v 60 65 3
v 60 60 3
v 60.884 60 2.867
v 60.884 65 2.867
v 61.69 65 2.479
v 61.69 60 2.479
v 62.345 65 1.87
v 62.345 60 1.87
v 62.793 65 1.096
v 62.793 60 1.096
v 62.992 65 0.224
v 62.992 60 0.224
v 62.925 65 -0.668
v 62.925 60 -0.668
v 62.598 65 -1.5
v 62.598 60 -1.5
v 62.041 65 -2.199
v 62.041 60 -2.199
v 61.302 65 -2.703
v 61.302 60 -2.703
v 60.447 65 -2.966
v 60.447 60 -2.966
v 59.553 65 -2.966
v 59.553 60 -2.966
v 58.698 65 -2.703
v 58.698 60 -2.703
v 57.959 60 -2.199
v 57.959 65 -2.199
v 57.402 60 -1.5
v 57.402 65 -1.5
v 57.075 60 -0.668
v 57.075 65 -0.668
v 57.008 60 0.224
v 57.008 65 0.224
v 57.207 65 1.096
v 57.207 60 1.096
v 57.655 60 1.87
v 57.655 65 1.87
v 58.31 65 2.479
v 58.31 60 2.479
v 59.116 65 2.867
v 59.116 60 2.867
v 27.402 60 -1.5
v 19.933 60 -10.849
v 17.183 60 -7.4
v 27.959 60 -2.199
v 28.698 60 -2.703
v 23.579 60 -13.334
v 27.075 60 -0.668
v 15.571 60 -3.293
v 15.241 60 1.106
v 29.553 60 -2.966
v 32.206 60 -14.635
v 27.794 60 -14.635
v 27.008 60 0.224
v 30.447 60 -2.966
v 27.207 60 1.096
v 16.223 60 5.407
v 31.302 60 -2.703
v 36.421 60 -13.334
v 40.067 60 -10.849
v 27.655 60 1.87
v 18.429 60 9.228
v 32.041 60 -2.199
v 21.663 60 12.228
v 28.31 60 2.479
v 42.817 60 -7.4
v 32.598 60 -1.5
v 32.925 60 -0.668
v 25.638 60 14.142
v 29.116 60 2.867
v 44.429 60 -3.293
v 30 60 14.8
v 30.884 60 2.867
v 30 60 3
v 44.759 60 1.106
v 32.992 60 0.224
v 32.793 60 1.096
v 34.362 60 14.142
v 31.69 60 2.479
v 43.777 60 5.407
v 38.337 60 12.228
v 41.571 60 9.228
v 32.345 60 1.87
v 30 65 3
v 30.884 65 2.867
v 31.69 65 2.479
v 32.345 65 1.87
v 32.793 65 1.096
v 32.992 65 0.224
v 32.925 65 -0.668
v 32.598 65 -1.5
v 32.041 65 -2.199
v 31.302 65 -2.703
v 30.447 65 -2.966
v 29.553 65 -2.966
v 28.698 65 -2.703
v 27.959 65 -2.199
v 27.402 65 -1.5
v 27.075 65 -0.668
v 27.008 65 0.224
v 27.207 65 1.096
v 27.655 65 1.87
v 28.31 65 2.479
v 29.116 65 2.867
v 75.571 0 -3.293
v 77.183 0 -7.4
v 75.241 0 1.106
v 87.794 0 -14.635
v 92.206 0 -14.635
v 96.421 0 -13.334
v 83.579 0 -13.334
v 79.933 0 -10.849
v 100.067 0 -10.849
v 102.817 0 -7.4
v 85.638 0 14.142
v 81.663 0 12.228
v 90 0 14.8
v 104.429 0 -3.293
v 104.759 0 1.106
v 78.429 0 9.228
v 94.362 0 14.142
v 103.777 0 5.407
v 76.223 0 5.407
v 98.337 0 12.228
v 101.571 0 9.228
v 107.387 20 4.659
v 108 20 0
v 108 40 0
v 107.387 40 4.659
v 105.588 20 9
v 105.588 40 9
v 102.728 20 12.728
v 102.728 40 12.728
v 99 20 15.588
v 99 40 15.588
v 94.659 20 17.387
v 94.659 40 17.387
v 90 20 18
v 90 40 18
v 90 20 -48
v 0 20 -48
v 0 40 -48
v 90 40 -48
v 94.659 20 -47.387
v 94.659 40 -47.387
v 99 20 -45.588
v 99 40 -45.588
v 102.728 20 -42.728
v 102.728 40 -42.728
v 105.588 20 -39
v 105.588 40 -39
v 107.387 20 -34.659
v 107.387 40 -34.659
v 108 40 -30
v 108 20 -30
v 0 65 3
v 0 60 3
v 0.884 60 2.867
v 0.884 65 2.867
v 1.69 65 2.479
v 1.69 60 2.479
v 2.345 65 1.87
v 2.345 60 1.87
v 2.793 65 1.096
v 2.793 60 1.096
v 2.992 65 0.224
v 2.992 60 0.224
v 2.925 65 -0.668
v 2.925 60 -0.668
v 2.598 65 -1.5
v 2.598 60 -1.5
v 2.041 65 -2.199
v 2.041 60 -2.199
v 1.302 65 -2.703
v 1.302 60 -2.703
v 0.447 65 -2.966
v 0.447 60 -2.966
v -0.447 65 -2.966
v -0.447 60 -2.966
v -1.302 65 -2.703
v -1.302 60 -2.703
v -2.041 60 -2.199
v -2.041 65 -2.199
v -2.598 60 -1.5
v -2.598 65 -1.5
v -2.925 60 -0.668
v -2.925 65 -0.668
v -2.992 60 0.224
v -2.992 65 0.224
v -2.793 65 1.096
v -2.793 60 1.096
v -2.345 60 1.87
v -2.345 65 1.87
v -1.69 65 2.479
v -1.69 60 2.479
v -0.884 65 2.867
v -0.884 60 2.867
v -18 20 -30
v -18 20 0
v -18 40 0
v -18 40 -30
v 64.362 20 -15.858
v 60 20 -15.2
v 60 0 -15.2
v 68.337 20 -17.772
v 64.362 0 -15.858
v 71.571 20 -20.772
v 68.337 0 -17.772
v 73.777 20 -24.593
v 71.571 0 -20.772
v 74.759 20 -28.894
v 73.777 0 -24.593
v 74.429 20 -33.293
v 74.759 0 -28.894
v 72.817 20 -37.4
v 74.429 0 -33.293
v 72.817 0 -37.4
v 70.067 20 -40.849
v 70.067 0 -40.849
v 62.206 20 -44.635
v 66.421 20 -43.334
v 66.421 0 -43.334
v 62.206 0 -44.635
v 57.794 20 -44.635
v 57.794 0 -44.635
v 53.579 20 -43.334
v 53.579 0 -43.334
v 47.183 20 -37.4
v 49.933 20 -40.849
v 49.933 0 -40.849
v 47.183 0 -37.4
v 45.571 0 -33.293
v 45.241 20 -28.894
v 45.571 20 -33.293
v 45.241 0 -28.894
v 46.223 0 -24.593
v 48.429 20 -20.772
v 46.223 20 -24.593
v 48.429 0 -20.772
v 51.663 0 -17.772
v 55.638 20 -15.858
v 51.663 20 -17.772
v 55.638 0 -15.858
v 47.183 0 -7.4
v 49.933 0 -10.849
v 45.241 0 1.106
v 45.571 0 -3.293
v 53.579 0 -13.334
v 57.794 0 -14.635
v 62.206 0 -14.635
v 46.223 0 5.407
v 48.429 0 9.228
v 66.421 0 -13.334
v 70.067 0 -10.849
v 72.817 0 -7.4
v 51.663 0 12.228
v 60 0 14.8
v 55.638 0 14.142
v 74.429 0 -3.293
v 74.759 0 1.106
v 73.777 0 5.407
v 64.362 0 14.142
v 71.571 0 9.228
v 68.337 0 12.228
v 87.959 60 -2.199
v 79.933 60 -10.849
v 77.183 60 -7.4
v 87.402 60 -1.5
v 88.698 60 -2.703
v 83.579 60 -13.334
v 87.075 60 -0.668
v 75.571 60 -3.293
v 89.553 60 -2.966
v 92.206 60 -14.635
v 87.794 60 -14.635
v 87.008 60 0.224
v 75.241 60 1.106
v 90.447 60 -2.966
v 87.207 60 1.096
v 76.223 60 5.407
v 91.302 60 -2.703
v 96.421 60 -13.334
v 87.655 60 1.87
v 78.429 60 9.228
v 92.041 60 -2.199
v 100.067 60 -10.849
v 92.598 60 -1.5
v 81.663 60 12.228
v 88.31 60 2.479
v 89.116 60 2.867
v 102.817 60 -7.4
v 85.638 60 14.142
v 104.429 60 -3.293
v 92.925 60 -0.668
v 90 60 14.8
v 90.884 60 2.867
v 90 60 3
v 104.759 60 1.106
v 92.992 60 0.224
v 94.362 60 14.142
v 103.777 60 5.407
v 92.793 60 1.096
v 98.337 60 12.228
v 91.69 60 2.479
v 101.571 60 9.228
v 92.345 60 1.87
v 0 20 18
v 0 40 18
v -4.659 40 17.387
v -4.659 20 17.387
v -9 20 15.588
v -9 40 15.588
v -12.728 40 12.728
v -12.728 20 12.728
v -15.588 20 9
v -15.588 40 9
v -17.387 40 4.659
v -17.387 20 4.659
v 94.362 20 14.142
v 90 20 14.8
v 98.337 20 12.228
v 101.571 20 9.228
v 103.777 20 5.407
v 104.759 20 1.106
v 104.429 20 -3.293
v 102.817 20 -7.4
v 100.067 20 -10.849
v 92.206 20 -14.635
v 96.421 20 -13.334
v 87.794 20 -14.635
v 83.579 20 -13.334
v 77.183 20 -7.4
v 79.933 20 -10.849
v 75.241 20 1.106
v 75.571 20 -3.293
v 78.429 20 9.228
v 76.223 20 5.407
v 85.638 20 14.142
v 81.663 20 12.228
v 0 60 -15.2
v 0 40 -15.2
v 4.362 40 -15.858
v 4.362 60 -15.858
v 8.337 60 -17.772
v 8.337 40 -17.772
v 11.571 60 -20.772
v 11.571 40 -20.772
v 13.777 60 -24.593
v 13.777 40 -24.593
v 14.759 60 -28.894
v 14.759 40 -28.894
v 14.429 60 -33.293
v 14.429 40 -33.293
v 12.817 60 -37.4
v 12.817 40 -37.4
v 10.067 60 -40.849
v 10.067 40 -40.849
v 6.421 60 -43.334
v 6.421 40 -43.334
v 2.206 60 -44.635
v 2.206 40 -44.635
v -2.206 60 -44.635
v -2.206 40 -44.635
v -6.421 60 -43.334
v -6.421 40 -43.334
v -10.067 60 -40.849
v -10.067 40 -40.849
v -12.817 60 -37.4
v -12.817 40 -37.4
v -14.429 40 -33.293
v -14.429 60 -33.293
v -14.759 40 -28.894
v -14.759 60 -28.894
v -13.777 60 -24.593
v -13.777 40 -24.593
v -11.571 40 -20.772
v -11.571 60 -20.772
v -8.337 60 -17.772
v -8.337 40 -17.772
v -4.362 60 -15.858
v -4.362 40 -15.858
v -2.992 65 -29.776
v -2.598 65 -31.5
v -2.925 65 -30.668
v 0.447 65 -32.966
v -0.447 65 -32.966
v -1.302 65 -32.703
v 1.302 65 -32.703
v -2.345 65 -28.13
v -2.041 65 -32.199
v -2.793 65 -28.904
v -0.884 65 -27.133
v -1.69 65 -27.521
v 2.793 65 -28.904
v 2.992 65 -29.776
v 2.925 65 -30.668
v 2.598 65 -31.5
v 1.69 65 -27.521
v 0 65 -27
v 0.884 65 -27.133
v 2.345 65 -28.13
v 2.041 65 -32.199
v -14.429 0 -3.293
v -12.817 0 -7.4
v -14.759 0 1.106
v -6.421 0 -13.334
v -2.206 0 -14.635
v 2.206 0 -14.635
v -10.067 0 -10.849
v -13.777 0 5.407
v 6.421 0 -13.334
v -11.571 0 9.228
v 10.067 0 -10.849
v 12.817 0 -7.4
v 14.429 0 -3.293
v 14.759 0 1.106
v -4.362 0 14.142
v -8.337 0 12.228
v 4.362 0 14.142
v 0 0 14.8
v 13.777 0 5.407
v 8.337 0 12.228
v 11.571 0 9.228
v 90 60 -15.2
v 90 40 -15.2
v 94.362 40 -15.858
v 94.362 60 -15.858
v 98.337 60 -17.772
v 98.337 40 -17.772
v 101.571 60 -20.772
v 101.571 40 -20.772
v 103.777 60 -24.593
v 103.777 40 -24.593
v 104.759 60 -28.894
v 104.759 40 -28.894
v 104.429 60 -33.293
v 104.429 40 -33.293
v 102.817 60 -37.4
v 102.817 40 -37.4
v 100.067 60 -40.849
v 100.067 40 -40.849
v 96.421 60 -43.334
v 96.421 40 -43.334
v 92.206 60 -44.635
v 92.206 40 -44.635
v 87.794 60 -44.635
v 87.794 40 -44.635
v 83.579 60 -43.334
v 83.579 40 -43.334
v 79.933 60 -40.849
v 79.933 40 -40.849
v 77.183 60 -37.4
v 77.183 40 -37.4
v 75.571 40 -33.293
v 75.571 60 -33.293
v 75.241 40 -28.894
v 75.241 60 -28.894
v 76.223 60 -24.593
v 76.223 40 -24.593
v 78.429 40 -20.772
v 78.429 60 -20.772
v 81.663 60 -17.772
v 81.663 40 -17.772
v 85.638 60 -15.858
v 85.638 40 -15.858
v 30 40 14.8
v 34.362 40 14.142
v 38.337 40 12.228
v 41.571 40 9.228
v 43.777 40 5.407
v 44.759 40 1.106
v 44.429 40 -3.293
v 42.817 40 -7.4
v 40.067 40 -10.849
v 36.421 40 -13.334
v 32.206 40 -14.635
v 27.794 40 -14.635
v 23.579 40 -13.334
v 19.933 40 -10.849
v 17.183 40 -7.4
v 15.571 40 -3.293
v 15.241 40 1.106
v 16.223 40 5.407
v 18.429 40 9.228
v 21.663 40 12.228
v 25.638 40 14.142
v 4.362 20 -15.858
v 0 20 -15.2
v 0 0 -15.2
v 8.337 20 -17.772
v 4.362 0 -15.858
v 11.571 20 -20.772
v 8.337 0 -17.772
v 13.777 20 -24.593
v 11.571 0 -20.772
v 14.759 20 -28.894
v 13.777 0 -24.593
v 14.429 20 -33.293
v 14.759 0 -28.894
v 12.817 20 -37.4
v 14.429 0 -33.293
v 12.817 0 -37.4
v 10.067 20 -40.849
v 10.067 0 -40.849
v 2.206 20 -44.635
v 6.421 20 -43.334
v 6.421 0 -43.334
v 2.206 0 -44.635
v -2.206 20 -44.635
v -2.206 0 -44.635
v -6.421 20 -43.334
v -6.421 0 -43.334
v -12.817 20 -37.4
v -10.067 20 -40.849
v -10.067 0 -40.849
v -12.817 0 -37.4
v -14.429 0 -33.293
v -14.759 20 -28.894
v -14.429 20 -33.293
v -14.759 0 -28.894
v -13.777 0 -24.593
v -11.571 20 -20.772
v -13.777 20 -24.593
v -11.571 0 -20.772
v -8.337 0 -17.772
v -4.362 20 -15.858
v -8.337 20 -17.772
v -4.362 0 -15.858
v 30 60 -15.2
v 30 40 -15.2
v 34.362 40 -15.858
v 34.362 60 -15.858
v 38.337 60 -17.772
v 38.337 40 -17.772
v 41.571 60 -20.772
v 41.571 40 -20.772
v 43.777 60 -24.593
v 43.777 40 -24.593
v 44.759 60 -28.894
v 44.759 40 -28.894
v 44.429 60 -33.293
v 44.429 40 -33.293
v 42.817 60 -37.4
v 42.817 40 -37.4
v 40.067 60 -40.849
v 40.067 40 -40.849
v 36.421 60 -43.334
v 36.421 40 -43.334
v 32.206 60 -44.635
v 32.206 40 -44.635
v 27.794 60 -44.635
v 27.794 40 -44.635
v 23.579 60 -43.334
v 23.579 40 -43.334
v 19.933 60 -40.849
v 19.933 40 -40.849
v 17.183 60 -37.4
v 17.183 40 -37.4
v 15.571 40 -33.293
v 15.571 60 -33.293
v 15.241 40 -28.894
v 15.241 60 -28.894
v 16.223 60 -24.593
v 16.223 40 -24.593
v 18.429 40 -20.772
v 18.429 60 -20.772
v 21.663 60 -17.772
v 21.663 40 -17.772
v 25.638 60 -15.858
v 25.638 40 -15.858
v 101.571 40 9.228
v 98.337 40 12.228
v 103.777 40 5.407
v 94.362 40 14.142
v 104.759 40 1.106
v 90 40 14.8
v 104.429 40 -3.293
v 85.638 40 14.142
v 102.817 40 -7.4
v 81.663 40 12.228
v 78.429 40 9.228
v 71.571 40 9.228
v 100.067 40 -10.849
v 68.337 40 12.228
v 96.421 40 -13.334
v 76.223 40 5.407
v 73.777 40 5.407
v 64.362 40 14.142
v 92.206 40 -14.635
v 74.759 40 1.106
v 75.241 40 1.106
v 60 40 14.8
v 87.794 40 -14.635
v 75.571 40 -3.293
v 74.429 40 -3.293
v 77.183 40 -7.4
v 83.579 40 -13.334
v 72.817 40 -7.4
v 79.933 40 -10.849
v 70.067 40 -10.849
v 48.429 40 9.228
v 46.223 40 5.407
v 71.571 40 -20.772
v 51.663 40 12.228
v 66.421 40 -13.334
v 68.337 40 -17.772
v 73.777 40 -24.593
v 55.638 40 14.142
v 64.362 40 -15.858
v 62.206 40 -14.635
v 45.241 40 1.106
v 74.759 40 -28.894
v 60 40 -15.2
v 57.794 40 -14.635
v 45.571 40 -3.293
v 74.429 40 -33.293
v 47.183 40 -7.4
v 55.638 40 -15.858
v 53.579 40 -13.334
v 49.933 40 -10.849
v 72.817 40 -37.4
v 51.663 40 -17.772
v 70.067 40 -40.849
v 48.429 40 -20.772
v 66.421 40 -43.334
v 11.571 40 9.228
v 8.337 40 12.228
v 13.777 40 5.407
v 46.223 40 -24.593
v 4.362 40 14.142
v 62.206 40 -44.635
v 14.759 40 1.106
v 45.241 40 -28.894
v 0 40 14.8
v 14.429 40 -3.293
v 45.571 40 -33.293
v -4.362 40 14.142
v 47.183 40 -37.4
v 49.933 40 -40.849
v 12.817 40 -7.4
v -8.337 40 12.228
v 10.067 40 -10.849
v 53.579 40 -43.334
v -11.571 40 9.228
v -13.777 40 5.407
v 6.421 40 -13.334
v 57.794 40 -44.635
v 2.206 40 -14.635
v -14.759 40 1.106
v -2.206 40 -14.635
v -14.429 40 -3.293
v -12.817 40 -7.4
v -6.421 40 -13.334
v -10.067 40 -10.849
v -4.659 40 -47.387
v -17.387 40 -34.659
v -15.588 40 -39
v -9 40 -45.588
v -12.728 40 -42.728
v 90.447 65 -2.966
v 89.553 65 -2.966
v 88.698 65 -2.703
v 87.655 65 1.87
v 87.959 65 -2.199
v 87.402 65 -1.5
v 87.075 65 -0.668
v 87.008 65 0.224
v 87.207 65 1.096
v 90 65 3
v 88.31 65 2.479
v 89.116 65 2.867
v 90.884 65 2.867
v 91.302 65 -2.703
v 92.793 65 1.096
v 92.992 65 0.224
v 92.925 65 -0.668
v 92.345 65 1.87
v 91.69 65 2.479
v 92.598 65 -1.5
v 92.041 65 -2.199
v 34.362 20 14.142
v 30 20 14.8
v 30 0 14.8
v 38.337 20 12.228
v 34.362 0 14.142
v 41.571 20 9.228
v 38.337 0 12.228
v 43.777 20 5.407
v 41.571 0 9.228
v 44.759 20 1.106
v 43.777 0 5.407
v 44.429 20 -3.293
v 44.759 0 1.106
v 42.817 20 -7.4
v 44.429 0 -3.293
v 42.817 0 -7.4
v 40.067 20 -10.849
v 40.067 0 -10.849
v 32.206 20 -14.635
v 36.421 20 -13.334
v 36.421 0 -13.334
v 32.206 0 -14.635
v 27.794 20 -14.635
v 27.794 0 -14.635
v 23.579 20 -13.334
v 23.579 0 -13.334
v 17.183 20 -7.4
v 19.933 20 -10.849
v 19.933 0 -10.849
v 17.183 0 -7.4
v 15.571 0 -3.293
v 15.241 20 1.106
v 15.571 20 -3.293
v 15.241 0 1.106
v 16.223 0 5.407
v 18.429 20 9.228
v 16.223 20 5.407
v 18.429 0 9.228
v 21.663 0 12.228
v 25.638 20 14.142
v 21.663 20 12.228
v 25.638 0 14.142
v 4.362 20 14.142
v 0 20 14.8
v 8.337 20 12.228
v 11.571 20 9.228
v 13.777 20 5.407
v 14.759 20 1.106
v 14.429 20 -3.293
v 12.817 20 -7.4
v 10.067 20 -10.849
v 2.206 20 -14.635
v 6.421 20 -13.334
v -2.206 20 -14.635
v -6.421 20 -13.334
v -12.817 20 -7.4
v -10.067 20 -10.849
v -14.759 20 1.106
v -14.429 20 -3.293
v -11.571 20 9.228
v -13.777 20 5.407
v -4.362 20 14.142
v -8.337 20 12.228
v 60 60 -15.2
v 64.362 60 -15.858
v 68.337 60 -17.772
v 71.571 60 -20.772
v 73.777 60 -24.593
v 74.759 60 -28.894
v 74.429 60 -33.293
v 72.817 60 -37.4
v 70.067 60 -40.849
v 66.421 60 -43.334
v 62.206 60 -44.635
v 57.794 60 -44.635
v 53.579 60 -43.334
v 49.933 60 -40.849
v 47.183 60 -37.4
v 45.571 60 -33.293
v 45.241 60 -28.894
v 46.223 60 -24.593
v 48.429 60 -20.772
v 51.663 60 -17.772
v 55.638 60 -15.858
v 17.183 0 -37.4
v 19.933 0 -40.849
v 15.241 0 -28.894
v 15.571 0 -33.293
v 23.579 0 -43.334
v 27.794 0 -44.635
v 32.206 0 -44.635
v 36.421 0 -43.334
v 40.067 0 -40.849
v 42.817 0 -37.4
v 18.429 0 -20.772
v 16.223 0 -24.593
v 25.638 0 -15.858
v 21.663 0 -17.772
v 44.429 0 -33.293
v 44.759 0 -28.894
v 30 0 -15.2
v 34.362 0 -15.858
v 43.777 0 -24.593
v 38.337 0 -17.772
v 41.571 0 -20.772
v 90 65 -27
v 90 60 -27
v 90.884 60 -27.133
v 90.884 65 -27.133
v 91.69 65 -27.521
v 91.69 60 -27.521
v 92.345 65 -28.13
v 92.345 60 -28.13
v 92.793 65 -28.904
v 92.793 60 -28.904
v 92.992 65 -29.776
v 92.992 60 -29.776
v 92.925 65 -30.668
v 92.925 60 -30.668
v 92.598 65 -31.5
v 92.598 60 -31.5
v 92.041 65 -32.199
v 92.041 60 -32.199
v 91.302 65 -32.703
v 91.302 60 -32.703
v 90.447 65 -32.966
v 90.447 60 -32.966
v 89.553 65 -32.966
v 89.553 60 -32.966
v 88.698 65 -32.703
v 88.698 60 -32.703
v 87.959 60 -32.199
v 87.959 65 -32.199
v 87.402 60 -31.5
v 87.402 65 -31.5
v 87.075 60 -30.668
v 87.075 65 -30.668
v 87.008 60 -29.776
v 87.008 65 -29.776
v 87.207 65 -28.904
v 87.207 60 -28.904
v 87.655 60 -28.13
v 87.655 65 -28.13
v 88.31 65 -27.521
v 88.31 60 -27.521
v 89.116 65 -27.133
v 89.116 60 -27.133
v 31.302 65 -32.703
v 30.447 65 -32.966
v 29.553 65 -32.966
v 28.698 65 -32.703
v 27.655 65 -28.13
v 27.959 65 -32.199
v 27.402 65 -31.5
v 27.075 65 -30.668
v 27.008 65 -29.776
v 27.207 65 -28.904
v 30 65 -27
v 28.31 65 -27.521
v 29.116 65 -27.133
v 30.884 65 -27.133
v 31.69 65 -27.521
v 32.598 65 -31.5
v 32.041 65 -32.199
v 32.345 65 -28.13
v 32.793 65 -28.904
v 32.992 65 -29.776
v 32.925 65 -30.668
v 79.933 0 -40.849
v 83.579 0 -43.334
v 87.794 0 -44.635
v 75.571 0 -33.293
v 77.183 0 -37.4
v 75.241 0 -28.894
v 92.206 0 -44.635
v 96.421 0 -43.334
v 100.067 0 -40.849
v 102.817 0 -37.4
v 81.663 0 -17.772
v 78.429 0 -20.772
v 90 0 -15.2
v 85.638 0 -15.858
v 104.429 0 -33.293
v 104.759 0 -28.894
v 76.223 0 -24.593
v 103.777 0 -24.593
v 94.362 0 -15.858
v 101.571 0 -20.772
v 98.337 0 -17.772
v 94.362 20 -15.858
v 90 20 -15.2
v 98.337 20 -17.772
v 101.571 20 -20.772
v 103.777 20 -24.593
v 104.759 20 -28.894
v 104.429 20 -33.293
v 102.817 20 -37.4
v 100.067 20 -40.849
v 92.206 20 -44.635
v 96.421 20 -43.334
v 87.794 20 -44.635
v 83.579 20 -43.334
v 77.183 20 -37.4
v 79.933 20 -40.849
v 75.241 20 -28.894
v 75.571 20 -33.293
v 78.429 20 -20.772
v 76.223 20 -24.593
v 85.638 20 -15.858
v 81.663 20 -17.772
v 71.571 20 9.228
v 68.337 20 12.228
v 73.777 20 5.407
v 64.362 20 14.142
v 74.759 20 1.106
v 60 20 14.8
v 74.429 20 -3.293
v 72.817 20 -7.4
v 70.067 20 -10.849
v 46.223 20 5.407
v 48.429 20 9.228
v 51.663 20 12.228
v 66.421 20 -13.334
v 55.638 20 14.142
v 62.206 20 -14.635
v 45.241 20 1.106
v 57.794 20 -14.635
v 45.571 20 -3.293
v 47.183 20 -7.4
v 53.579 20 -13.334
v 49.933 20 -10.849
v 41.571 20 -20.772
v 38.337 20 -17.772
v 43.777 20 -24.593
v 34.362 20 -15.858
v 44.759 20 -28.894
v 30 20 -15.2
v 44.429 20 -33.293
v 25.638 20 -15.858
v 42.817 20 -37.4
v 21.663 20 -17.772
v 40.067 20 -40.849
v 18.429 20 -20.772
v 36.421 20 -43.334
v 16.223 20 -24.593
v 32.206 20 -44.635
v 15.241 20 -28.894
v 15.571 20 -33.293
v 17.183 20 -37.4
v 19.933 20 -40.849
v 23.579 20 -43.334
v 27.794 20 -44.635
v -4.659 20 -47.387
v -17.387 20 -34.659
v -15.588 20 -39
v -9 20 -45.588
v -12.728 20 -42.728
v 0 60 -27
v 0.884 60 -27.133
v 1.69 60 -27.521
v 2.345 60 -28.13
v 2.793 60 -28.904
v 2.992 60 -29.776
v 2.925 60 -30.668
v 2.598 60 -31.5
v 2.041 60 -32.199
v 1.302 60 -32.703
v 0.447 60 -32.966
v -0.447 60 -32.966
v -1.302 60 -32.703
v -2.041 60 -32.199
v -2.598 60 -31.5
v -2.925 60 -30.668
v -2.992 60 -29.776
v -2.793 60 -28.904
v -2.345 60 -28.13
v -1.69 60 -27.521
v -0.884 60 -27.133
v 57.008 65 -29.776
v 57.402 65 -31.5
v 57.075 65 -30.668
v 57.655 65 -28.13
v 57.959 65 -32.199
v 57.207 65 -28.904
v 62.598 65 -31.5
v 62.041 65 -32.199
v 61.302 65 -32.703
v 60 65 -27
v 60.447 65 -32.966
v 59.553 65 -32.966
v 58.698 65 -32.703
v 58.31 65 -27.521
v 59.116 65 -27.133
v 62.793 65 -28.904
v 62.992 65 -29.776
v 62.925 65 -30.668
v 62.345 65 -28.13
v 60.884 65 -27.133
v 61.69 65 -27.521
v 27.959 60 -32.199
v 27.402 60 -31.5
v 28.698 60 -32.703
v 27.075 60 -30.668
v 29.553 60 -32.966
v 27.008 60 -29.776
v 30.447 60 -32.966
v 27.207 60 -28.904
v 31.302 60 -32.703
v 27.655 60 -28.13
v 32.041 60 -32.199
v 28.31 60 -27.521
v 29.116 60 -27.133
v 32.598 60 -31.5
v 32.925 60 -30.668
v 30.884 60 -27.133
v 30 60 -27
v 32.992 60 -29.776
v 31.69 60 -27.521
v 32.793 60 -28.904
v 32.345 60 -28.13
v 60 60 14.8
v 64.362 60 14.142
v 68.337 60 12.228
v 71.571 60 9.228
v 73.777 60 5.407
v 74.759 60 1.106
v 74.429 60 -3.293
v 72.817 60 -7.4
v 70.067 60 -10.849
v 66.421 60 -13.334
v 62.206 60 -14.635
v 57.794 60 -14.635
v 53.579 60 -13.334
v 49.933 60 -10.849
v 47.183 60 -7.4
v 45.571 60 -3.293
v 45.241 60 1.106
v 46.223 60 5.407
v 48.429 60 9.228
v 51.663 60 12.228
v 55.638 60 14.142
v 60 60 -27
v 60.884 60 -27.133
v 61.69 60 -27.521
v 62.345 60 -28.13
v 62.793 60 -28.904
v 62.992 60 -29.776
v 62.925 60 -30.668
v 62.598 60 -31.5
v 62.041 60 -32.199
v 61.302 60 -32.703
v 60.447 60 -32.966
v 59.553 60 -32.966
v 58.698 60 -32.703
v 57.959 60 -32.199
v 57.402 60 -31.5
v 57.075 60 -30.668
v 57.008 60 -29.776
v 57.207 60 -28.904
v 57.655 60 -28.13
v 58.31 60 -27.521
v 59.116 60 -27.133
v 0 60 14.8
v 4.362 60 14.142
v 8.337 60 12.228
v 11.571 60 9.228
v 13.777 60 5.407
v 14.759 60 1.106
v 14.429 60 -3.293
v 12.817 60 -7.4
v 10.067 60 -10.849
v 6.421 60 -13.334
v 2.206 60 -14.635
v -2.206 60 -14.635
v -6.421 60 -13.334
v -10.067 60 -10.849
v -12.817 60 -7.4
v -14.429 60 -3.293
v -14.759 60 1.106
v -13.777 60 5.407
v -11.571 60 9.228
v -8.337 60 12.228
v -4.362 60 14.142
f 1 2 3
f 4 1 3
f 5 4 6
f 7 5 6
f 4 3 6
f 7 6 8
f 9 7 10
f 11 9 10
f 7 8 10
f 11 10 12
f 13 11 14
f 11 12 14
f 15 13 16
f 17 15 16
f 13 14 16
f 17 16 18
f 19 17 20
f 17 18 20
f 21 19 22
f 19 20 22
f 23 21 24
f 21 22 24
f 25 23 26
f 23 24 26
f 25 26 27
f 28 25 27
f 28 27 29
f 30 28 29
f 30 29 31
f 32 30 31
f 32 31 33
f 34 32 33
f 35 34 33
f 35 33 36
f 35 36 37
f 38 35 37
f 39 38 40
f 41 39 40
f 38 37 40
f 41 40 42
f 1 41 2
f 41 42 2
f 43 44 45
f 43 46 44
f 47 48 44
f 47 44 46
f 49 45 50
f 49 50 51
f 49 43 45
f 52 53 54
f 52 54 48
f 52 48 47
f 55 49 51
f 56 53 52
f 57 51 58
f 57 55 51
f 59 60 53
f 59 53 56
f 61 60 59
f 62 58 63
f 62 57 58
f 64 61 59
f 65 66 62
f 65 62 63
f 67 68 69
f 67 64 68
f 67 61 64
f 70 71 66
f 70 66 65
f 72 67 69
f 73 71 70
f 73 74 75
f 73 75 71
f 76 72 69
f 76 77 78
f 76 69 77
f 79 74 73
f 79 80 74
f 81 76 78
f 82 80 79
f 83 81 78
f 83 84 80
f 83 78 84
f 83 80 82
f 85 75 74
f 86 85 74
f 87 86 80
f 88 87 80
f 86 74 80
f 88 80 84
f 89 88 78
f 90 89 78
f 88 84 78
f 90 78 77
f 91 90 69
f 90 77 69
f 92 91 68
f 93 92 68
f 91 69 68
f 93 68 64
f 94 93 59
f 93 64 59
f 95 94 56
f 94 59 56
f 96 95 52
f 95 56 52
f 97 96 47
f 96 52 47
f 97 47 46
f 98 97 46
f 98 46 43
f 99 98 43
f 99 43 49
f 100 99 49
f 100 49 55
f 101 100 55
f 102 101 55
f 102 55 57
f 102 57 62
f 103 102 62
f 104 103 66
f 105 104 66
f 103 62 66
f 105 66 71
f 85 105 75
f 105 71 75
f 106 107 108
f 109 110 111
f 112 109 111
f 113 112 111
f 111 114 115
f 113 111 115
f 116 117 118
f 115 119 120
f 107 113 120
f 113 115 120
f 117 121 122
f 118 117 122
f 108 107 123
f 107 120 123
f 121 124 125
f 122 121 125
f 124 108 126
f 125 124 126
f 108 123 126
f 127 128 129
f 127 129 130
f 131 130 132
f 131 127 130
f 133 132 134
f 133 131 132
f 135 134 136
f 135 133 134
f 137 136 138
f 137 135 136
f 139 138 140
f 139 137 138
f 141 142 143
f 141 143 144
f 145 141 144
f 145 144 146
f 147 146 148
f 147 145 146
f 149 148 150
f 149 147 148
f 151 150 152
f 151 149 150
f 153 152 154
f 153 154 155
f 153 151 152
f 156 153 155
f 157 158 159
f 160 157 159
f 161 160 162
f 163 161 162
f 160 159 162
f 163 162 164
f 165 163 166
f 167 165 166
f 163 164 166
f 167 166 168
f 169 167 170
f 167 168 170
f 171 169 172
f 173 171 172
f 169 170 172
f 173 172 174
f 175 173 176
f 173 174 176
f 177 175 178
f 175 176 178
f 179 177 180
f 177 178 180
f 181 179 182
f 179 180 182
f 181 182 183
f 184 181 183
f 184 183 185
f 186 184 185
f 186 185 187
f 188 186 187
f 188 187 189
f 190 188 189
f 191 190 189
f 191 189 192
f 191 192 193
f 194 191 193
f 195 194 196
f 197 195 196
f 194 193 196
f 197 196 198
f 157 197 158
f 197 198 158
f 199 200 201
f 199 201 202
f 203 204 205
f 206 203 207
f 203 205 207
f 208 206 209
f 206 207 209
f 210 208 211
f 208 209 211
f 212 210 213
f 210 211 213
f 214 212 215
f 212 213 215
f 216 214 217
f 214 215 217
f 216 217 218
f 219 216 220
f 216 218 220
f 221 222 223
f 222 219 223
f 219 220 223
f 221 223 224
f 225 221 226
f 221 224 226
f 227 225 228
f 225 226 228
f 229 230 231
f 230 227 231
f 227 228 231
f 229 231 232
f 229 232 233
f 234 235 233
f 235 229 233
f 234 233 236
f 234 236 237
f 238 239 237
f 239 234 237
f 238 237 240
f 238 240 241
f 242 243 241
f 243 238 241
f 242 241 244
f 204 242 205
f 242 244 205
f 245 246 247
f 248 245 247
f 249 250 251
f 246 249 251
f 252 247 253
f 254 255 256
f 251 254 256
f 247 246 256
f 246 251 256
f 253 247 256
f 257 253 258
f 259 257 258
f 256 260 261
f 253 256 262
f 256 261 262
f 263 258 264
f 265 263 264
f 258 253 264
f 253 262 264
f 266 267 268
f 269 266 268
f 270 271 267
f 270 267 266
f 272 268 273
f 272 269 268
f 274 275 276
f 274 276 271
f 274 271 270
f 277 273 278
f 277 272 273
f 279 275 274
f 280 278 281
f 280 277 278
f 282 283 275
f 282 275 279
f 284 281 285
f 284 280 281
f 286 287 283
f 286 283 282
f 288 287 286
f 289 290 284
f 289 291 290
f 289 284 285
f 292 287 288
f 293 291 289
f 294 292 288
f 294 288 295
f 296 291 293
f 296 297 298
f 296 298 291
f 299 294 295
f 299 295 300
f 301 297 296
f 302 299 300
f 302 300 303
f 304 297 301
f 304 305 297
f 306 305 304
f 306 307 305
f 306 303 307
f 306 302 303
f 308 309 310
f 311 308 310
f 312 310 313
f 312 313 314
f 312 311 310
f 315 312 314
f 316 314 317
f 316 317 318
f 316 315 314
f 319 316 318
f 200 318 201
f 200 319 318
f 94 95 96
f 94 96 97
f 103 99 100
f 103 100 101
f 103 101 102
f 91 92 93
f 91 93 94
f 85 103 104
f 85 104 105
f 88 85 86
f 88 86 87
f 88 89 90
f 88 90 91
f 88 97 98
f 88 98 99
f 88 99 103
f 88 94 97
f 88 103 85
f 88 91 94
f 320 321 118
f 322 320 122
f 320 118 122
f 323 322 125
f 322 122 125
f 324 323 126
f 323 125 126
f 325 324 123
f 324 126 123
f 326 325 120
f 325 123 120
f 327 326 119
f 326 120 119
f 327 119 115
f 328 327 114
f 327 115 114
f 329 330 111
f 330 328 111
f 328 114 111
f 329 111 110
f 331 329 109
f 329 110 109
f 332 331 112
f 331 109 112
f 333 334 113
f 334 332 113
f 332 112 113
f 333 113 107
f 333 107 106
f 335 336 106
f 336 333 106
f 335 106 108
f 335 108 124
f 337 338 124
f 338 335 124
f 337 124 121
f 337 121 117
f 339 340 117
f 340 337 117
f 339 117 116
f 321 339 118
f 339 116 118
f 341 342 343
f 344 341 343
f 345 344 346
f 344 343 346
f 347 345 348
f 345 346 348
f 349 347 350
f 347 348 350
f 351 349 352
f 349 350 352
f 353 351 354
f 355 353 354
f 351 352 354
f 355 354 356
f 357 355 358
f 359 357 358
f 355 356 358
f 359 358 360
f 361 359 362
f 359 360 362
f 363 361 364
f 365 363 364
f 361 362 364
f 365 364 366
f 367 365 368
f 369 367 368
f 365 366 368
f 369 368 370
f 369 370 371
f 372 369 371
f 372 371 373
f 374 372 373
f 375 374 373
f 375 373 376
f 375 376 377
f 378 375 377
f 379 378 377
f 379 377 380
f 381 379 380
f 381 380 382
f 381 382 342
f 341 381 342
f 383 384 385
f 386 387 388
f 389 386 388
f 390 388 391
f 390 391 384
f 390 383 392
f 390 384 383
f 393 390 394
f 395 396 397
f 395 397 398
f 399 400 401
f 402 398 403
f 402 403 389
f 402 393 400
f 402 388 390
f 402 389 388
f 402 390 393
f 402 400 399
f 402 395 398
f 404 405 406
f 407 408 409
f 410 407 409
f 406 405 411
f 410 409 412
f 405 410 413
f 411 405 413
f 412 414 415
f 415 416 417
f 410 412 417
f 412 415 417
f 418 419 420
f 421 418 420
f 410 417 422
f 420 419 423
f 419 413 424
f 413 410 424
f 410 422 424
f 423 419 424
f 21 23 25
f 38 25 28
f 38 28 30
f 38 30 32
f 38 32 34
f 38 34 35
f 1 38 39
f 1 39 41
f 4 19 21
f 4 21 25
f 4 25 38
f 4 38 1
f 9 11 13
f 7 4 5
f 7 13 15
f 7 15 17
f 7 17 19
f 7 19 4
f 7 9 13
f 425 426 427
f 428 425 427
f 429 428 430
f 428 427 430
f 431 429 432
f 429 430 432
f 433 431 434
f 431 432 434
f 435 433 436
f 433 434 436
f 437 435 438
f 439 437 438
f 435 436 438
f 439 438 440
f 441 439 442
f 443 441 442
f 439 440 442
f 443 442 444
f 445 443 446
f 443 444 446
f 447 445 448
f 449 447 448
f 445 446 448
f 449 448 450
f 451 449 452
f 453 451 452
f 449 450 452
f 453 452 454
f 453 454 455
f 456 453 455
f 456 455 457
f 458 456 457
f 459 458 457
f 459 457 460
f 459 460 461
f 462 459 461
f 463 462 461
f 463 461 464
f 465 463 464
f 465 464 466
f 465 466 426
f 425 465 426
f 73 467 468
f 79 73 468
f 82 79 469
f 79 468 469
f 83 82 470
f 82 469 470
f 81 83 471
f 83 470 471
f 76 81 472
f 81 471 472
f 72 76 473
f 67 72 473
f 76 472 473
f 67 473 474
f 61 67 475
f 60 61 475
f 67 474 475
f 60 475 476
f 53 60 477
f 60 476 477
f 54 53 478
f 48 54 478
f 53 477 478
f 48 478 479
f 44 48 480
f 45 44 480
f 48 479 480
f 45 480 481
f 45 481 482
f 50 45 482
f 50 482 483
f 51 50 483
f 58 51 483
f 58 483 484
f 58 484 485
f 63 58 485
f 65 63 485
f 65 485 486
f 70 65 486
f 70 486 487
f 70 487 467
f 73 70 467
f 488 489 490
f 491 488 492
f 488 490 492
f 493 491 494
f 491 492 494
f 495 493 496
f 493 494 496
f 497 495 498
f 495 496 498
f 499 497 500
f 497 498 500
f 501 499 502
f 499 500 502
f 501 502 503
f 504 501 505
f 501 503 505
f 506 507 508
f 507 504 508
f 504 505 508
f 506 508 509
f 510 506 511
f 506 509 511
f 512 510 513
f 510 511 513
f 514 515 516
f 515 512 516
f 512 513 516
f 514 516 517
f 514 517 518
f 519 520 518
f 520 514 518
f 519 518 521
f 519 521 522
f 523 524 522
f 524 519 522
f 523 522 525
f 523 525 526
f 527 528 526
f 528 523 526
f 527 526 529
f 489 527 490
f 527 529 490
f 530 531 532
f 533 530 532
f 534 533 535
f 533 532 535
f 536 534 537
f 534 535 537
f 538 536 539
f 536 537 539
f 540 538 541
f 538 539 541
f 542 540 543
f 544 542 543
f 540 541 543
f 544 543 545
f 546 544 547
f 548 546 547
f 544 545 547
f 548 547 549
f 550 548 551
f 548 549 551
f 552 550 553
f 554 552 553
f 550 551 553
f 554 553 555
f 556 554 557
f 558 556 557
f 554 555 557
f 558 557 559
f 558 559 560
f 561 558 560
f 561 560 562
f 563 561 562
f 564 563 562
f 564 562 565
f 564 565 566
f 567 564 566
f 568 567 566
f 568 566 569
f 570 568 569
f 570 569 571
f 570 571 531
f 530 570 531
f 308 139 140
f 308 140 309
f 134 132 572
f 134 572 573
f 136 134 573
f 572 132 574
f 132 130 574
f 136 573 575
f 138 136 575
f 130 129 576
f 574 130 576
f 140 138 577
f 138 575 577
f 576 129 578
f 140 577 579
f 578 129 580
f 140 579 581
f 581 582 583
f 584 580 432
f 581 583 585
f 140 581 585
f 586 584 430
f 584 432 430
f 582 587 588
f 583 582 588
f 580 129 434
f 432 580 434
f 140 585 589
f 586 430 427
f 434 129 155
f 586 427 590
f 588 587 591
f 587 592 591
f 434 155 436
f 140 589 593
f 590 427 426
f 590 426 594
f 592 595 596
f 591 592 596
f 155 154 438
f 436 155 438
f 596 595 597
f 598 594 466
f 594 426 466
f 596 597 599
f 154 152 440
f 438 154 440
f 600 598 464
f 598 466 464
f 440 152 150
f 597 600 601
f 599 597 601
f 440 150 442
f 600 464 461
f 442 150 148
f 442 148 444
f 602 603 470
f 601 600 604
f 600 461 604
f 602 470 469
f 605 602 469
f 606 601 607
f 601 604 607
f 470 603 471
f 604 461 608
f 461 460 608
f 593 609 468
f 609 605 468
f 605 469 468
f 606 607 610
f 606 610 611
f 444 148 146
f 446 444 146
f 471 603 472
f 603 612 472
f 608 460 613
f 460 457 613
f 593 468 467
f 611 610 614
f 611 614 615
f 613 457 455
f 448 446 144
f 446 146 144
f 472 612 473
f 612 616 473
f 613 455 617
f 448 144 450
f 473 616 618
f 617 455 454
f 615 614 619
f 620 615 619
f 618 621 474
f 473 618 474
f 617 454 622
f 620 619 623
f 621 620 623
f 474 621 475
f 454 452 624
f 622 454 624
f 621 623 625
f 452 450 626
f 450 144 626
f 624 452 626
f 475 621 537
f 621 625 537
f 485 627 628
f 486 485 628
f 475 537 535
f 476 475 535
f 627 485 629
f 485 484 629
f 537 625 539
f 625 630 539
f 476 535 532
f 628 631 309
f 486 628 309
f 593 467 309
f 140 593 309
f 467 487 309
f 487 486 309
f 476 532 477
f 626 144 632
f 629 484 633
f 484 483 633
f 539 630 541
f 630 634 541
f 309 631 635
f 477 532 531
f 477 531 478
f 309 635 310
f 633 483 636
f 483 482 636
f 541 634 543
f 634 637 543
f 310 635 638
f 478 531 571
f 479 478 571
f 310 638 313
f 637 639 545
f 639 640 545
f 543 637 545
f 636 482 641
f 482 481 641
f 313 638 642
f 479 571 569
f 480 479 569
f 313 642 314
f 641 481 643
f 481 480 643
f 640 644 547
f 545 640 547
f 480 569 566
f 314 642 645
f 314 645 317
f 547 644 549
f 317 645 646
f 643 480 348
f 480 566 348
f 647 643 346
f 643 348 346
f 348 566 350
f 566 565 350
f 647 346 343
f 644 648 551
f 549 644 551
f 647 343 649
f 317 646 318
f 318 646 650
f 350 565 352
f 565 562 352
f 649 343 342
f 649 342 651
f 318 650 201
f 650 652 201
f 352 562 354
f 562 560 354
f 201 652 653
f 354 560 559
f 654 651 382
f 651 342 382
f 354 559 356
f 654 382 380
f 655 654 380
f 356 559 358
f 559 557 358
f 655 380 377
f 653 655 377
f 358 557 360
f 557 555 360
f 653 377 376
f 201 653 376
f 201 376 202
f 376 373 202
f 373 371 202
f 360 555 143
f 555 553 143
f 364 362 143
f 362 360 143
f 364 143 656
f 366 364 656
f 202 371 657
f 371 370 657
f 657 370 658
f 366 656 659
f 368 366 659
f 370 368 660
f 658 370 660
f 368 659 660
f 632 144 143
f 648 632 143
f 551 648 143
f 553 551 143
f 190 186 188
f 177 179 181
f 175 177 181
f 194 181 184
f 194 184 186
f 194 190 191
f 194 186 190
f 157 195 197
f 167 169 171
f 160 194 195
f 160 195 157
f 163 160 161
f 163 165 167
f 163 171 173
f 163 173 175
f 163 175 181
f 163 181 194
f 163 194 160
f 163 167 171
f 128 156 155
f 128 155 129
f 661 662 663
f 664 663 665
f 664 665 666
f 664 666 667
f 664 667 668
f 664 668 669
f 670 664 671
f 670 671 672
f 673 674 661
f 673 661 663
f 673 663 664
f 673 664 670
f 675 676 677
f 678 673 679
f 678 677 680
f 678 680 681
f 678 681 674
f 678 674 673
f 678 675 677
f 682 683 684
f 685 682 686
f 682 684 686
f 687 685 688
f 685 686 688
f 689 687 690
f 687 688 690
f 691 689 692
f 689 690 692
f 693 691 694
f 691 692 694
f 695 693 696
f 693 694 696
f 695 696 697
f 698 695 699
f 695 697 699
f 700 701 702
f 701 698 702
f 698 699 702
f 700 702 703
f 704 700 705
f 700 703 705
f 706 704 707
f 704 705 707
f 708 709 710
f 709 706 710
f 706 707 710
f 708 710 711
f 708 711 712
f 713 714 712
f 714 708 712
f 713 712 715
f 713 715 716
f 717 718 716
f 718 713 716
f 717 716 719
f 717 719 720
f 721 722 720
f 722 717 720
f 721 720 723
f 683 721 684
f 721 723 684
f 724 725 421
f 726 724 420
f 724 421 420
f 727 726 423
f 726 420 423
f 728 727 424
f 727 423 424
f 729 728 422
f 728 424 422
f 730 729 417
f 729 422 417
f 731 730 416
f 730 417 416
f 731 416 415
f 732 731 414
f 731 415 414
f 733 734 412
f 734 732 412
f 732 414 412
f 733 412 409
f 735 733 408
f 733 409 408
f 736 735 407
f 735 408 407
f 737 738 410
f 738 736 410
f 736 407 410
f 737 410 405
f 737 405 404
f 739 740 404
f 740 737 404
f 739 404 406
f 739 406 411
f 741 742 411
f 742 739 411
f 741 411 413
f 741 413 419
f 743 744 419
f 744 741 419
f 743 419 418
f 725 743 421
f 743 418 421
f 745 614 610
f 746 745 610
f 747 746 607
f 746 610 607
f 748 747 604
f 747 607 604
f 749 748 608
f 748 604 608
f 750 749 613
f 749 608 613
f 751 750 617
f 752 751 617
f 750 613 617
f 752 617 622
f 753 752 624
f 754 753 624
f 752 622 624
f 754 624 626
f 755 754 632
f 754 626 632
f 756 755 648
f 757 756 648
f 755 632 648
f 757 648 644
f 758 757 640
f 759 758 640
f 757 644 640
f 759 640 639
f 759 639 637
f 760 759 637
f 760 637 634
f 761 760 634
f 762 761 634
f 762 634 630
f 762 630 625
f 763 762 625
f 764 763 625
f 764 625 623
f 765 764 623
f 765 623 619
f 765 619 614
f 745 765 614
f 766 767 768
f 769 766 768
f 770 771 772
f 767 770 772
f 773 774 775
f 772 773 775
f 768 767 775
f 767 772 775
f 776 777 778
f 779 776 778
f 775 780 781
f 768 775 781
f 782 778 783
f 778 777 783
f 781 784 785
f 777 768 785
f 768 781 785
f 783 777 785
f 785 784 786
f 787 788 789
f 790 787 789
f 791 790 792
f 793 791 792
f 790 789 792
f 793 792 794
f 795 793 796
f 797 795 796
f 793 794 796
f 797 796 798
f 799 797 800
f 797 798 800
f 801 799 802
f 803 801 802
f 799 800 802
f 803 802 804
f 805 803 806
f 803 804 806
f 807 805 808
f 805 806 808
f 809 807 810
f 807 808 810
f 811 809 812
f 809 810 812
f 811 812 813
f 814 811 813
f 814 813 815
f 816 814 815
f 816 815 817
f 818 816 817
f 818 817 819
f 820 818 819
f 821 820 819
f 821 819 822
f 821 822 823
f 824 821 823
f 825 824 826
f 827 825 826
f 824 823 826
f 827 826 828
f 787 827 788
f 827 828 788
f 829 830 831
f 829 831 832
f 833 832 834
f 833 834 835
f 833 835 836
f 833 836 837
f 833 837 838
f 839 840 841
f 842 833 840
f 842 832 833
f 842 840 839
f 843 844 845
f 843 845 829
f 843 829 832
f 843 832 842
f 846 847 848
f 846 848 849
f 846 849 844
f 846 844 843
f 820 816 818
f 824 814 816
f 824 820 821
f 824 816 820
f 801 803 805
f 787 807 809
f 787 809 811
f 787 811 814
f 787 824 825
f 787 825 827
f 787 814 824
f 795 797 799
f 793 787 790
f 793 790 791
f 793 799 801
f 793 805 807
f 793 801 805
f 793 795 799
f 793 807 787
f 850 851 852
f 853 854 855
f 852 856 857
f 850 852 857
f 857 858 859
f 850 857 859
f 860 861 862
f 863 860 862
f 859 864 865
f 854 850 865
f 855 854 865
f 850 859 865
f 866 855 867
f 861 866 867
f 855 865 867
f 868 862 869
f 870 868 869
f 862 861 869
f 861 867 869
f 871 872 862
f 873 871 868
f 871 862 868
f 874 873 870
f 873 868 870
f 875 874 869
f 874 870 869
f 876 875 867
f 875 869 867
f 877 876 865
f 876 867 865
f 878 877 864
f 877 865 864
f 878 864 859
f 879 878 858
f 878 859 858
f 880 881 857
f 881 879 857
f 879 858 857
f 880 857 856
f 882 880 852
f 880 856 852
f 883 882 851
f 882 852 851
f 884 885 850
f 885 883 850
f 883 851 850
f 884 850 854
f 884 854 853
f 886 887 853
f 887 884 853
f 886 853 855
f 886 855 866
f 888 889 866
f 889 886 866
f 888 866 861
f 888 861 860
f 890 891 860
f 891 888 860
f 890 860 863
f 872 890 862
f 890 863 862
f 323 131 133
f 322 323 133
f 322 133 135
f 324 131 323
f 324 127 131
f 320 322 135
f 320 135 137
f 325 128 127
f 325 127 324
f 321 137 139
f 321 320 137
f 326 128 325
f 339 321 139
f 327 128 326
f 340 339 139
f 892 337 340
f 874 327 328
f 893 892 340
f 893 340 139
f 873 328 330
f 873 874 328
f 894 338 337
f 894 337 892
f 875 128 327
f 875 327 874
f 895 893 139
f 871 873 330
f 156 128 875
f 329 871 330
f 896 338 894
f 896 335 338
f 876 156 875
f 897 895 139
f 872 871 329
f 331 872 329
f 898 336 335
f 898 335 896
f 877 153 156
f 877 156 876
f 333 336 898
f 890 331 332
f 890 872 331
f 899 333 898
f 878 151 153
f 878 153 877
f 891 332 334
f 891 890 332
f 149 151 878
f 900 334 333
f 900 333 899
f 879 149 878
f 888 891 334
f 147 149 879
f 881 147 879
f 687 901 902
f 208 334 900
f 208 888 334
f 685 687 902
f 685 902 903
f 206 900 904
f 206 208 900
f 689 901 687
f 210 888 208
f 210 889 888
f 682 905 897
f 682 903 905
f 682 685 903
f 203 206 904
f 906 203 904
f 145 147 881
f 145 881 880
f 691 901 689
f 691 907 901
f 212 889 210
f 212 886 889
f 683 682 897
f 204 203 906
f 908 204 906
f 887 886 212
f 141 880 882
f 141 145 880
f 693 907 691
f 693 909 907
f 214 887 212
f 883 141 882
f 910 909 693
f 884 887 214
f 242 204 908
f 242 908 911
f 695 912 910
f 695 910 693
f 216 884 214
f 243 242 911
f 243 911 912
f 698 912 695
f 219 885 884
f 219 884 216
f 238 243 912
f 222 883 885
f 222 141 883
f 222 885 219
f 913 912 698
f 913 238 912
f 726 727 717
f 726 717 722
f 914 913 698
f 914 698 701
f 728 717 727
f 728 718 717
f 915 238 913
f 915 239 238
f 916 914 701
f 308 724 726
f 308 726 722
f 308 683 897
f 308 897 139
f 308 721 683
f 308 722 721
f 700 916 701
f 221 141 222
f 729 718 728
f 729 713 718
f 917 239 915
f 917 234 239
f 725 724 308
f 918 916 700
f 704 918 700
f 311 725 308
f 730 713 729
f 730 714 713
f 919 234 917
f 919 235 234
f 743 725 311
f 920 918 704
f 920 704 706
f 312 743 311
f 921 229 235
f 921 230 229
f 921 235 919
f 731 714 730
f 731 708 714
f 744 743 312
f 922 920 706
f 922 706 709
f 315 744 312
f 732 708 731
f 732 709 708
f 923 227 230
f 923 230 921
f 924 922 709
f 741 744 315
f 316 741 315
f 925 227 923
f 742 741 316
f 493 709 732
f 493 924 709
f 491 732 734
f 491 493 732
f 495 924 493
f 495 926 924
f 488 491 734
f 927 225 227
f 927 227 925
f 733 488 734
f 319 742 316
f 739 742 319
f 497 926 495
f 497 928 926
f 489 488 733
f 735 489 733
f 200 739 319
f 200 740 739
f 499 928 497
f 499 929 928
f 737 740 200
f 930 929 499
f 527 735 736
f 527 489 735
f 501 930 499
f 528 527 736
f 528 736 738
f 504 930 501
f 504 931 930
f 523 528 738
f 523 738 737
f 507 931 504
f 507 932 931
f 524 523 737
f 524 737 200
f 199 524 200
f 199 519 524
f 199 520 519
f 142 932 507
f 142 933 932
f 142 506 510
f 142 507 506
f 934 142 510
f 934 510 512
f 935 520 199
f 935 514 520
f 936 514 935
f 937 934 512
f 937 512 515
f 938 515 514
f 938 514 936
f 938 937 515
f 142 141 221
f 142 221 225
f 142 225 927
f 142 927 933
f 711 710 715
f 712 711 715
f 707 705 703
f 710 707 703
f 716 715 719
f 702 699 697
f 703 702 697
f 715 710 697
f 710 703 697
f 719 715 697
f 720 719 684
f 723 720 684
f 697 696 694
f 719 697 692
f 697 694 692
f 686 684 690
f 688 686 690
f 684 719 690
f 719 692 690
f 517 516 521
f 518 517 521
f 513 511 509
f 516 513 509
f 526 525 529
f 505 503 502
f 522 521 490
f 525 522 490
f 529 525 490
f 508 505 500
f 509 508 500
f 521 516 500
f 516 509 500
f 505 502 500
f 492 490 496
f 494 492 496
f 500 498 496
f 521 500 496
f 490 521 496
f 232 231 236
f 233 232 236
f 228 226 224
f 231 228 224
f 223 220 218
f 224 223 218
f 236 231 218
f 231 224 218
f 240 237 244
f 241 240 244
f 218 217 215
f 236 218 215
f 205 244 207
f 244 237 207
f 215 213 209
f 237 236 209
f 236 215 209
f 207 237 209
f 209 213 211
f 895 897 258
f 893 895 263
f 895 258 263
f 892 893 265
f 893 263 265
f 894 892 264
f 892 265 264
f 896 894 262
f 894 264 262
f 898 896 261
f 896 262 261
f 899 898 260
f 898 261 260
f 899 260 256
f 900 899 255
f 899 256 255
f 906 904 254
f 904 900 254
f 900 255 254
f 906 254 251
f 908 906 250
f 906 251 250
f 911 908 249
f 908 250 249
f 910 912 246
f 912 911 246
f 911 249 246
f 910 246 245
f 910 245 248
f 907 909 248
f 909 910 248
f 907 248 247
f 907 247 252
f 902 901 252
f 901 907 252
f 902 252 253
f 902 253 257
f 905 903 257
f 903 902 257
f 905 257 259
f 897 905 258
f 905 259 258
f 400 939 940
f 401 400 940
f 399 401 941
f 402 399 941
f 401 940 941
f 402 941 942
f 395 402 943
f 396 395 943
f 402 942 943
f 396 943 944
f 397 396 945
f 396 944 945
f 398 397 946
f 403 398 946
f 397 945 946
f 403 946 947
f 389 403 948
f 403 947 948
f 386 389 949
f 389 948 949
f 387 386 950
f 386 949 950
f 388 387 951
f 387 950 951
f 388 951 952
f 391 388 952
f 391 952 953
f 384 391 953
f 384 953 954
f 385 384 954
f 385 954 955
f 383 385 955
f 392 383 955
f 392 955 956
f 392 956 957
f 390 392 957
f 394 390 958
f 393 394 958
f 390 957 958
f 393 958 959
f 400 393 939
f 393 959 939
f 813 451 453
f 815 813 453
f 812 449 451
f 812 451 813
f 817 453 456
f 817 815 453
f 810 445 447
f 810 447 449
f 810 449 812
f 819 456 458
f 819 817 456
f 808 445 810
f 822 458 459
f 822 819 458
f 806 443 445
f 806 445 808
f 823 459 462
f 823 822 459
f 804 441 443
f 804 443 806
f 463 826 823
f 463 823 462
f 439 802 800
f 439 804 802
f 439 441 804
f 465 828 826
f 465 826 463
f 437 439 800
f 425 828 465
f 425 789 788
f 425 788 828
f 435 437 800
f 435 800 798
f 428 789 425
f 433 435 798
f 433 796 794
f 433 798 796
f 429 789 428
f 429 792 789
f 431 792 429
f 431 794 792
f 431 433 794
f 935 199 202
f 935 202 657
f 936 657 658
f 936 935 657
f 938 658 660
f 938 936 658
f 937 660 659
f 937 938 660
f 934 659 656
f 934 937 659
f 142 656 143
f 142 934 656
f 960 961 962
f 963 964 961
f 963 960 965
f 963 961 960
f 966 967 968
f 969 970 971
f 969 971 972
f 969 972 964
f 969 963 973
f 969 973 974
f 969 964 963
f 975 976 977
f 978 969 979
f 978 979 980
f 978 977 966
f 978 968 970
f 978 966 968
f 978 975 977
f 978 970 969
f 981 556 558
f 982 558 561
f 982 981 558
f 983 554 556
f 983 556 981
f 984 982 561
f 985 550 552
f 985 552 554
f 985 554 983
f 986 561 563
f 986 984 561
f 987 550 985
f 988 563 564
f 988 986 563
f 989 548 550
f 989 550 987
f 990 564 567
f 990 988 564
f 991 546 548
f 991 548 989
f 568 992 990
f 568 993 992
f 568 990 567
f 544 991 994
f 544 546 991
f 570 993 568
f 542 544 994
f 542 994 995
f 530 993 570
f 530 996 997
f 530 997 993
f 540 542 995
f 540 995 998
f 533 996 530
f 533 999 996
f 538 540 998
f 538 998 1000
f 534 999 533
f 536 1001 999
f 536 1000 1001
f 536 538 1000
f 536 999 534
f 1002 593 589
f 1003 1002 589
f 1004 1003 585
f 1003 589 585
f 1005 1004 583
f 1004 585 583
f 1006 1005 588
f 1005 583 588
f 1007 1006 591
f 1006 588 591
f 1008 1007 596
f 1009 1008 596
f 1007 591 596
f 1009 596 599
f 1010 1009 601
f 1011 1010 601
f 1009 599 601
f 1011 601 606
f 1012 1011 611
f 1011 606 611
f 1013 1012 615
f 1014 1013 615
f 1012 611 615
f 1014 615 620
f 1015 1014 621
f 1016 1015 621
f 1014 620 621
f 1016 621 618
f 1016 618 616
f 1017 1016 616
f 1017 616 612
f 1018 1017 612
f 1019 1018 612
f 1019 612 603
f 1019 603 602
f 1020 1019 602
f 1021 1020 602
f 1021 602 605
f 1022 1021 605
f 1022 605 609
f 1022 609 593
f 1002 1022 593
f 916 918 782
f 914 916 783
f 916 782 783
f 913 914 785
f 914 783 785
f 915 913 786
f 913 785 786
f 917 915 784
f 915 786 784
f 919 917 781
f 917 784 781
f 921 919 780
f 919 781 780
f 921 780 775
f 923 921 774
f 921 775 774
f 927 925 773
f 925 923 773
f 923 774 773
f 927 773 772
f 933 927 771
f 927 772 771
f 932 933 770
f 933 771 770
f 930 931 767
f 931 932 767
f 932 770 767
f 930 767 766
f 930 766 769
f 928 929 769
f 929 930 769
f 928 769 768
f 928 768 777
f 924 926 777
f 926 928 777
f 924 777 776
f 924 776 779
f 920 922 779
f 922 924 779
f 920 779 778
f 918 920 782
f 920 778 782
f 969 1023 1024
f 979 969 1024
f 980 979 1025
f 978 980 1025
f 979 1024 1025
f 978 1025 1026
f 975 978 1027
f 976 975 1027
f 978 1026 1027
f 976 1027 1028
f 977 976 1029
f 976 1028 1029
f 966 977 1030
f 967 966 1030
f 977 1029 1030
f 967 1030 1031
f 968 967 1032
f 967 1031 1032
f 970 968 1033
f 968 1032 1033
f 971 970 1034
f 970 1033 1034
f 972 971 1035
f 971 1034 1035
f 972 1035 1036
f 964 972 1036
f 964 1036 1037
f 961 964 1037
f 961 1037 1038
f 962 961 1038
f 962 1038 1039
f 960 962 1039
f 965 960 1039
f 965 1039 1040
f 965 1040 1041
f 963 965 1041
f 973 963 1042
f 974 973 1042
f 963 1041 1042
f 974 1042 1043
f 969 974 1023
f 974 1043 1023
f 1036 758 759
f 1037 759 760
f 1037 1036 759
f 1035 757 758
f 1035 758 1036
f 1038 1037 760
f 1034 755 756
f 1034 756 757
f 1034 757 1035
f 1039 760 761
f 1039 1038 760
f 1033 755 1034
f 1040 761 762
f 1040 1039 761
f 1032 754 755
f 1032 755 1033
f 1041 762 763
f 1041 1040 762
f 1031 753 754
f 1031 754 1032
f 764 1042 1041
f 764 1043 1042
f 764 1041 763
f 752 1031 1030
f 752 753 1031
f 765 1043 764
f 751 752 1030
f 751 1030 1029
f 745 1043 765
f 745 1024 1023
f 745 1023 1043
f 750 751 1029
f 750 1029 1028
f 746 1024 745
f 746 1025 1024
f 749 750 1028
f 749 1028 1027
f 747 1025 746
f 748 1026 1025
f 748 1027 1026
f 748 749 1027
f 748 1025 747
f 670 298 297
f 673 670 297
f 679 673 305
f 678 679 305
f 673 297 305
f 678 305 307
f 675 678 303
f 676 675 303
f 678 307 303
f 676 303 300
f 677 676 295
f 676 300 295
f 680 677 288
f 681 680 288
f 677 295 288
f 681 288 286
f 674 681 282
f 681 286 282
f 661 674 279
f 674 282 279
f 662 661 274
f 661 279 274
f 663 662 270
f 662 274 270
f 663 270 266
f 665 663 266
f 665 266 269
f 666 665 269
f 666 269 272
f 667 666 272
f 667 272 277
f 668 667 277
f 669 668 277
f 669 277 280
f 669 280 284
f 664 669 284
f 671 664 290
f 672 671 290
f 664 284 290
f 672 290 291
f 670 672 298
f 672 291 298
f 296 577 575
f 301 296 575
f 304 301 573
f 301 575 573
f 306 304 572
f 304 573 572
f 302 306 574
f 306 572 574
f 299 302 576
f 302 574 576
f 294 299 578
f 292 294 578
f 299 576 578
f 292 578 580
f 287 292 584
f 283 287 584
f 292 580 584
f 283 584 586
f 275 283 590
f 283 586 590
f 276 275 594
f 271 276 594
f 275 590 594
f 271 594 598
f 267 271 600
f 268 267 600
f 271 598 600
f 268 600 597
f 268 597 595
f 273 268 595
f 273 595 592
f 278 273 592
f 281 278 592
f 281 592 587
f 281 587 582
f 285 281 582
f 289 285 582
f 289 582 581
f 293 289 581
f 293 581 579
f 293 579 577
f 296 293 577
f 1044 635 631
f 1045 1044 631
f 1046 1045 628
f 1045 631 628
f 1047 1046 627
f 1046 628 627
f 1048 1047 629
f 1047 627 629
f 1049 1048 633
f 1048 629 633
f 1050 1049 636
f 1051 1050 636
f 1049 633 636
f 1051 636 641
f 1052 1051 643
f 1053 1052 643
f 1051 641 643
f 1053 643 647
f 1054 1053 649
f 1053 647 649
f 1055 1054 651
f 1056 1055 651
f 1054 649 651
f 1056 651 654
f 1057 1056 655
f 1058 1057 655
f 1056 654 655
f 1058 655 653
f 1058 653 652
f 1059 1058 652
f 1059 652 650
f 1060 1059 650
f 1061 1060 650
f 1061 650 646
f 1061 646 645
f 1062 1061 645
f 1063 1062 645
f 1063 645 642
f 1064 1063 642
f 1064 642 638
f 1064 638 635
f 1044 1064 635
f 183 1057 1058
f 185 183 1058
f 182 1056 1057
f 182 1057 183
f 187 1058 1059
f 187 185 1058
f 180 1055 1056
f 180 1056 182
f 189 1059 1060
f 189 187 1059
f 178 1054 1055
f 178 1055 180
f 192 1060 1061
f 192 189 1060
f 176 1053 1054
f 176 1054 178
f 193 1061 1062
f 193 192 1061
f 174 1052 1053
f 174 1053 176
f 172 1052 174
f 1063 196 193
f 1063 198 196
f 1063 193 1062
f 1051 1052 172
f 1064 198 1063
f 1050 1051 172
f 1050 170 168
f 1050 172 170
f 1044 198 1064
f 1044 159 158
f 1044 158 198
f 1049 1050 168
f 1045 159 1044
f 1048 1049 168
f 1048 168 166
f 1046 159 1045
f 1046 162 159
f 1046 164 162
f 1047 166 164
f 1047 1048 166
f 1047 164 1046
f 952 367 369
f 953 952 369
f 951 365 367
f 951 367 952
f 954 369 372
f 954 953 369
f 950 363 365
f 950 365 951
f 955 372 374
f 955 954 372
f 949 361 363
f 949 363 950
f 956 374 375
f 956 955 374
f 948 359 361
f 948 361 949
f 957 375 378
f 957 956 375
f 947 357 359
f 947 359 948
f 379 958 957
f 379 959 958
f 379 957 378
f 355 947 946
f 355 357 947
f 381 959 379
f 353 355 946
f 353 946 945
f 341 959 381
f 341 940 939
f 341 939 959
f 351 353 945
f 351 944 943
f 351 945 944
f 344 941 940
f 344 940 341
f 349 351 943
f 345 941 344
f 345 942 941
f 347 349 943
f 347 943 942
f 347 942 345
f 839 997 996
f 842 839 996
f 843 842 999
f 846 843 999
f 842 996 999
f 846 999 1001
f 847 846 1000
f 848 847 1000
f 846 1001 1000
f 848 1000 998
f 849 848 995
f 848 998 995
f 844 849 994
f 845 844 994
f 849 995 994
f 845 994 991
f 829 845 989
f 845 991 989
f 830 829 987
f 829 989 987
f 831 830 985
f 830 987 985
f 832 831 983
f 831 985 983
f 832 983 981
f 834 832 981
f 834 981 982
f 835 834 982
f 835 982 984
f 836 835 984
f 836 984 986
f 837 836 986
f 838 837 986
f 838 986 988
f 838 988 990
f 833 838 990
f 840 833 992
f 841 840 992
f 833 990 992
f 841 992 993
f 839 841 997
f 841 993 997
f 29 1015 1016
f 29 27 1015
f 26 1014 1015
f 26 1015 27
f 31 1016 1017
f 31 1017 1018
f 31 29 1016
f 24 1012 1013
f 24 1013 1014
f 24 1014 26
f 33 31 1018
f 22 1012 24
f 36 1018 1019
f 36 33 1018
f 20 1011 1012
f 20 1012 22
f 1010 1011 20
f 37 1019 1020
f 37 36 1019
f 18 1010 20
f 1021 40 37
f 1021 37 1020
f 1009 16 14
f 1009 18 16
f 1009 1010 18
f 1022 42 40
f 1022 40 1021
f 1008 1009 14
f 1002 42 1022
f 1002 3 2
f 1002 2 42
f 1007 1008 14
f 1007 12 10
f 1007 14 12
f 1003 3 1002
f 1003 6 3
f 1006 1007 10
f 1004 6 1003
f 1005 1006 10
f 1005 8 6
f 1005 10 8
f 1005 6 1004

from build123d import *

# Parameters (mm, degrees)
EXTRUDE_8_DEPTH = 20
SKETCH_1_R      = 14.8
EXTRUDE_1_DEPTH = 60
SKETCH_2_R      = 3
EXTRUDE_2_DEPTH = 5


with BuildPart() as part:
    # 草图3 → 凸台-拉伸8 (new body)
    with BuildSketch(Plane(origin=(0, 20, 0), x_dir=(1, 0, 0), z_dir=(0, 1, 0))):
        with BuildLine():
            Line((0, 48), (90, 48))
            ThreePointArc((90, 48), (102.727922061, 42.727922061), (108, 30))
            Line((108, 30), (108, 0))
            ThreePointArc((108, 0), (102.727922061, -12.727922061), (90, -18))
            Line((90, -18), (0, -18))
            ThreePointArc((0, -18), (-12.727922061, -12.727922061), (-18, 0))
            Line((-18, 0), (-18, 30))
            ThreePointArc((-18, 30), (-12.727922061, 42.727922061), (0, 48))
        make_face()
    extrude(amount=EXTRUDE_8_DEPTH)

    # 草图1 → 凸台-拉伸1 (add)
    with BuildSketch(Plane(origin=(0, 0, 0), x_dir=(1, 0, 0), z_dir=(0, 1, 0))):
        with Locations(Location((0, 30, 0), (0, 0, 270))):
            Circle(SKETCH_1_R)
        with Locations(Location((30, 30, 0), (0, 0, 270))):
            Circle(SKETCH_1_R)
        with Locations(Location((60, 30, 0), (0, 0, 270))):
            Circle(SKETCH_1_R)
        with Locations(Location((90, 30, 0), (0, 0, 270))):
            Circle(SKETCH_1_R)
        with Locations(Location((90, 0, 0), (0, 0, 270))):
            Circle(SKETCH_1_R)
        with Locations(Location((60, 0, 0), (0, 0, 270))):
            Circle(SKETCH_1_R)
        with Locations(Location((30, 0, 0), (0, 0, 270))):
            Circle(SKETCH_1_R)
        with Locations(Location((0, 0, 0), (0, 0, 270))):
            Circle(SKETCH_1_R)
    extrude(amount=EXTRUDE_1_DEPTH)

    # 草图2 → 凸台-拉伸2 (add)
    with BuildSketch(Plane(origin=(0, 60, 0), x_dir=(1, 0, 0), z_dir=(0, 1, 0))):
        with Locations(Location((0, 30, 0), (0, 0, 270))):
            Circle(SKETCH_2_R)
        with Locations(Location((30, 30, 0), (0, 0, 270))):
            Circle(SKETCH_2_R)
        with Locations(Location((60, 30, 0), (0, 0, 270))):
            Circle(SKETCH_2_R)
        with Locations(Location((90, 30, 0), (0, 0, 270))):
            Circle(SKETCH_2_R)
        with Locations(Location((30, 0, 0), (0, 0, 270))):
            Circle(SKETCH_2_R)
        with Locations(Location((60, 0, 0), (0, 0, 270))):
            Circle(SKETCH_2_R)
        with Locations(Location((90, 0, 0), (0, 0, 270))):
            Circle(SKETCH_2_R)
        with Locations(Location((0, 0, 0), (0, 0, 270))):
            Circle(SKETCH_2_R)
    extrude(amount=EXTRUDE_2_DEPTH)


solid = part.part
